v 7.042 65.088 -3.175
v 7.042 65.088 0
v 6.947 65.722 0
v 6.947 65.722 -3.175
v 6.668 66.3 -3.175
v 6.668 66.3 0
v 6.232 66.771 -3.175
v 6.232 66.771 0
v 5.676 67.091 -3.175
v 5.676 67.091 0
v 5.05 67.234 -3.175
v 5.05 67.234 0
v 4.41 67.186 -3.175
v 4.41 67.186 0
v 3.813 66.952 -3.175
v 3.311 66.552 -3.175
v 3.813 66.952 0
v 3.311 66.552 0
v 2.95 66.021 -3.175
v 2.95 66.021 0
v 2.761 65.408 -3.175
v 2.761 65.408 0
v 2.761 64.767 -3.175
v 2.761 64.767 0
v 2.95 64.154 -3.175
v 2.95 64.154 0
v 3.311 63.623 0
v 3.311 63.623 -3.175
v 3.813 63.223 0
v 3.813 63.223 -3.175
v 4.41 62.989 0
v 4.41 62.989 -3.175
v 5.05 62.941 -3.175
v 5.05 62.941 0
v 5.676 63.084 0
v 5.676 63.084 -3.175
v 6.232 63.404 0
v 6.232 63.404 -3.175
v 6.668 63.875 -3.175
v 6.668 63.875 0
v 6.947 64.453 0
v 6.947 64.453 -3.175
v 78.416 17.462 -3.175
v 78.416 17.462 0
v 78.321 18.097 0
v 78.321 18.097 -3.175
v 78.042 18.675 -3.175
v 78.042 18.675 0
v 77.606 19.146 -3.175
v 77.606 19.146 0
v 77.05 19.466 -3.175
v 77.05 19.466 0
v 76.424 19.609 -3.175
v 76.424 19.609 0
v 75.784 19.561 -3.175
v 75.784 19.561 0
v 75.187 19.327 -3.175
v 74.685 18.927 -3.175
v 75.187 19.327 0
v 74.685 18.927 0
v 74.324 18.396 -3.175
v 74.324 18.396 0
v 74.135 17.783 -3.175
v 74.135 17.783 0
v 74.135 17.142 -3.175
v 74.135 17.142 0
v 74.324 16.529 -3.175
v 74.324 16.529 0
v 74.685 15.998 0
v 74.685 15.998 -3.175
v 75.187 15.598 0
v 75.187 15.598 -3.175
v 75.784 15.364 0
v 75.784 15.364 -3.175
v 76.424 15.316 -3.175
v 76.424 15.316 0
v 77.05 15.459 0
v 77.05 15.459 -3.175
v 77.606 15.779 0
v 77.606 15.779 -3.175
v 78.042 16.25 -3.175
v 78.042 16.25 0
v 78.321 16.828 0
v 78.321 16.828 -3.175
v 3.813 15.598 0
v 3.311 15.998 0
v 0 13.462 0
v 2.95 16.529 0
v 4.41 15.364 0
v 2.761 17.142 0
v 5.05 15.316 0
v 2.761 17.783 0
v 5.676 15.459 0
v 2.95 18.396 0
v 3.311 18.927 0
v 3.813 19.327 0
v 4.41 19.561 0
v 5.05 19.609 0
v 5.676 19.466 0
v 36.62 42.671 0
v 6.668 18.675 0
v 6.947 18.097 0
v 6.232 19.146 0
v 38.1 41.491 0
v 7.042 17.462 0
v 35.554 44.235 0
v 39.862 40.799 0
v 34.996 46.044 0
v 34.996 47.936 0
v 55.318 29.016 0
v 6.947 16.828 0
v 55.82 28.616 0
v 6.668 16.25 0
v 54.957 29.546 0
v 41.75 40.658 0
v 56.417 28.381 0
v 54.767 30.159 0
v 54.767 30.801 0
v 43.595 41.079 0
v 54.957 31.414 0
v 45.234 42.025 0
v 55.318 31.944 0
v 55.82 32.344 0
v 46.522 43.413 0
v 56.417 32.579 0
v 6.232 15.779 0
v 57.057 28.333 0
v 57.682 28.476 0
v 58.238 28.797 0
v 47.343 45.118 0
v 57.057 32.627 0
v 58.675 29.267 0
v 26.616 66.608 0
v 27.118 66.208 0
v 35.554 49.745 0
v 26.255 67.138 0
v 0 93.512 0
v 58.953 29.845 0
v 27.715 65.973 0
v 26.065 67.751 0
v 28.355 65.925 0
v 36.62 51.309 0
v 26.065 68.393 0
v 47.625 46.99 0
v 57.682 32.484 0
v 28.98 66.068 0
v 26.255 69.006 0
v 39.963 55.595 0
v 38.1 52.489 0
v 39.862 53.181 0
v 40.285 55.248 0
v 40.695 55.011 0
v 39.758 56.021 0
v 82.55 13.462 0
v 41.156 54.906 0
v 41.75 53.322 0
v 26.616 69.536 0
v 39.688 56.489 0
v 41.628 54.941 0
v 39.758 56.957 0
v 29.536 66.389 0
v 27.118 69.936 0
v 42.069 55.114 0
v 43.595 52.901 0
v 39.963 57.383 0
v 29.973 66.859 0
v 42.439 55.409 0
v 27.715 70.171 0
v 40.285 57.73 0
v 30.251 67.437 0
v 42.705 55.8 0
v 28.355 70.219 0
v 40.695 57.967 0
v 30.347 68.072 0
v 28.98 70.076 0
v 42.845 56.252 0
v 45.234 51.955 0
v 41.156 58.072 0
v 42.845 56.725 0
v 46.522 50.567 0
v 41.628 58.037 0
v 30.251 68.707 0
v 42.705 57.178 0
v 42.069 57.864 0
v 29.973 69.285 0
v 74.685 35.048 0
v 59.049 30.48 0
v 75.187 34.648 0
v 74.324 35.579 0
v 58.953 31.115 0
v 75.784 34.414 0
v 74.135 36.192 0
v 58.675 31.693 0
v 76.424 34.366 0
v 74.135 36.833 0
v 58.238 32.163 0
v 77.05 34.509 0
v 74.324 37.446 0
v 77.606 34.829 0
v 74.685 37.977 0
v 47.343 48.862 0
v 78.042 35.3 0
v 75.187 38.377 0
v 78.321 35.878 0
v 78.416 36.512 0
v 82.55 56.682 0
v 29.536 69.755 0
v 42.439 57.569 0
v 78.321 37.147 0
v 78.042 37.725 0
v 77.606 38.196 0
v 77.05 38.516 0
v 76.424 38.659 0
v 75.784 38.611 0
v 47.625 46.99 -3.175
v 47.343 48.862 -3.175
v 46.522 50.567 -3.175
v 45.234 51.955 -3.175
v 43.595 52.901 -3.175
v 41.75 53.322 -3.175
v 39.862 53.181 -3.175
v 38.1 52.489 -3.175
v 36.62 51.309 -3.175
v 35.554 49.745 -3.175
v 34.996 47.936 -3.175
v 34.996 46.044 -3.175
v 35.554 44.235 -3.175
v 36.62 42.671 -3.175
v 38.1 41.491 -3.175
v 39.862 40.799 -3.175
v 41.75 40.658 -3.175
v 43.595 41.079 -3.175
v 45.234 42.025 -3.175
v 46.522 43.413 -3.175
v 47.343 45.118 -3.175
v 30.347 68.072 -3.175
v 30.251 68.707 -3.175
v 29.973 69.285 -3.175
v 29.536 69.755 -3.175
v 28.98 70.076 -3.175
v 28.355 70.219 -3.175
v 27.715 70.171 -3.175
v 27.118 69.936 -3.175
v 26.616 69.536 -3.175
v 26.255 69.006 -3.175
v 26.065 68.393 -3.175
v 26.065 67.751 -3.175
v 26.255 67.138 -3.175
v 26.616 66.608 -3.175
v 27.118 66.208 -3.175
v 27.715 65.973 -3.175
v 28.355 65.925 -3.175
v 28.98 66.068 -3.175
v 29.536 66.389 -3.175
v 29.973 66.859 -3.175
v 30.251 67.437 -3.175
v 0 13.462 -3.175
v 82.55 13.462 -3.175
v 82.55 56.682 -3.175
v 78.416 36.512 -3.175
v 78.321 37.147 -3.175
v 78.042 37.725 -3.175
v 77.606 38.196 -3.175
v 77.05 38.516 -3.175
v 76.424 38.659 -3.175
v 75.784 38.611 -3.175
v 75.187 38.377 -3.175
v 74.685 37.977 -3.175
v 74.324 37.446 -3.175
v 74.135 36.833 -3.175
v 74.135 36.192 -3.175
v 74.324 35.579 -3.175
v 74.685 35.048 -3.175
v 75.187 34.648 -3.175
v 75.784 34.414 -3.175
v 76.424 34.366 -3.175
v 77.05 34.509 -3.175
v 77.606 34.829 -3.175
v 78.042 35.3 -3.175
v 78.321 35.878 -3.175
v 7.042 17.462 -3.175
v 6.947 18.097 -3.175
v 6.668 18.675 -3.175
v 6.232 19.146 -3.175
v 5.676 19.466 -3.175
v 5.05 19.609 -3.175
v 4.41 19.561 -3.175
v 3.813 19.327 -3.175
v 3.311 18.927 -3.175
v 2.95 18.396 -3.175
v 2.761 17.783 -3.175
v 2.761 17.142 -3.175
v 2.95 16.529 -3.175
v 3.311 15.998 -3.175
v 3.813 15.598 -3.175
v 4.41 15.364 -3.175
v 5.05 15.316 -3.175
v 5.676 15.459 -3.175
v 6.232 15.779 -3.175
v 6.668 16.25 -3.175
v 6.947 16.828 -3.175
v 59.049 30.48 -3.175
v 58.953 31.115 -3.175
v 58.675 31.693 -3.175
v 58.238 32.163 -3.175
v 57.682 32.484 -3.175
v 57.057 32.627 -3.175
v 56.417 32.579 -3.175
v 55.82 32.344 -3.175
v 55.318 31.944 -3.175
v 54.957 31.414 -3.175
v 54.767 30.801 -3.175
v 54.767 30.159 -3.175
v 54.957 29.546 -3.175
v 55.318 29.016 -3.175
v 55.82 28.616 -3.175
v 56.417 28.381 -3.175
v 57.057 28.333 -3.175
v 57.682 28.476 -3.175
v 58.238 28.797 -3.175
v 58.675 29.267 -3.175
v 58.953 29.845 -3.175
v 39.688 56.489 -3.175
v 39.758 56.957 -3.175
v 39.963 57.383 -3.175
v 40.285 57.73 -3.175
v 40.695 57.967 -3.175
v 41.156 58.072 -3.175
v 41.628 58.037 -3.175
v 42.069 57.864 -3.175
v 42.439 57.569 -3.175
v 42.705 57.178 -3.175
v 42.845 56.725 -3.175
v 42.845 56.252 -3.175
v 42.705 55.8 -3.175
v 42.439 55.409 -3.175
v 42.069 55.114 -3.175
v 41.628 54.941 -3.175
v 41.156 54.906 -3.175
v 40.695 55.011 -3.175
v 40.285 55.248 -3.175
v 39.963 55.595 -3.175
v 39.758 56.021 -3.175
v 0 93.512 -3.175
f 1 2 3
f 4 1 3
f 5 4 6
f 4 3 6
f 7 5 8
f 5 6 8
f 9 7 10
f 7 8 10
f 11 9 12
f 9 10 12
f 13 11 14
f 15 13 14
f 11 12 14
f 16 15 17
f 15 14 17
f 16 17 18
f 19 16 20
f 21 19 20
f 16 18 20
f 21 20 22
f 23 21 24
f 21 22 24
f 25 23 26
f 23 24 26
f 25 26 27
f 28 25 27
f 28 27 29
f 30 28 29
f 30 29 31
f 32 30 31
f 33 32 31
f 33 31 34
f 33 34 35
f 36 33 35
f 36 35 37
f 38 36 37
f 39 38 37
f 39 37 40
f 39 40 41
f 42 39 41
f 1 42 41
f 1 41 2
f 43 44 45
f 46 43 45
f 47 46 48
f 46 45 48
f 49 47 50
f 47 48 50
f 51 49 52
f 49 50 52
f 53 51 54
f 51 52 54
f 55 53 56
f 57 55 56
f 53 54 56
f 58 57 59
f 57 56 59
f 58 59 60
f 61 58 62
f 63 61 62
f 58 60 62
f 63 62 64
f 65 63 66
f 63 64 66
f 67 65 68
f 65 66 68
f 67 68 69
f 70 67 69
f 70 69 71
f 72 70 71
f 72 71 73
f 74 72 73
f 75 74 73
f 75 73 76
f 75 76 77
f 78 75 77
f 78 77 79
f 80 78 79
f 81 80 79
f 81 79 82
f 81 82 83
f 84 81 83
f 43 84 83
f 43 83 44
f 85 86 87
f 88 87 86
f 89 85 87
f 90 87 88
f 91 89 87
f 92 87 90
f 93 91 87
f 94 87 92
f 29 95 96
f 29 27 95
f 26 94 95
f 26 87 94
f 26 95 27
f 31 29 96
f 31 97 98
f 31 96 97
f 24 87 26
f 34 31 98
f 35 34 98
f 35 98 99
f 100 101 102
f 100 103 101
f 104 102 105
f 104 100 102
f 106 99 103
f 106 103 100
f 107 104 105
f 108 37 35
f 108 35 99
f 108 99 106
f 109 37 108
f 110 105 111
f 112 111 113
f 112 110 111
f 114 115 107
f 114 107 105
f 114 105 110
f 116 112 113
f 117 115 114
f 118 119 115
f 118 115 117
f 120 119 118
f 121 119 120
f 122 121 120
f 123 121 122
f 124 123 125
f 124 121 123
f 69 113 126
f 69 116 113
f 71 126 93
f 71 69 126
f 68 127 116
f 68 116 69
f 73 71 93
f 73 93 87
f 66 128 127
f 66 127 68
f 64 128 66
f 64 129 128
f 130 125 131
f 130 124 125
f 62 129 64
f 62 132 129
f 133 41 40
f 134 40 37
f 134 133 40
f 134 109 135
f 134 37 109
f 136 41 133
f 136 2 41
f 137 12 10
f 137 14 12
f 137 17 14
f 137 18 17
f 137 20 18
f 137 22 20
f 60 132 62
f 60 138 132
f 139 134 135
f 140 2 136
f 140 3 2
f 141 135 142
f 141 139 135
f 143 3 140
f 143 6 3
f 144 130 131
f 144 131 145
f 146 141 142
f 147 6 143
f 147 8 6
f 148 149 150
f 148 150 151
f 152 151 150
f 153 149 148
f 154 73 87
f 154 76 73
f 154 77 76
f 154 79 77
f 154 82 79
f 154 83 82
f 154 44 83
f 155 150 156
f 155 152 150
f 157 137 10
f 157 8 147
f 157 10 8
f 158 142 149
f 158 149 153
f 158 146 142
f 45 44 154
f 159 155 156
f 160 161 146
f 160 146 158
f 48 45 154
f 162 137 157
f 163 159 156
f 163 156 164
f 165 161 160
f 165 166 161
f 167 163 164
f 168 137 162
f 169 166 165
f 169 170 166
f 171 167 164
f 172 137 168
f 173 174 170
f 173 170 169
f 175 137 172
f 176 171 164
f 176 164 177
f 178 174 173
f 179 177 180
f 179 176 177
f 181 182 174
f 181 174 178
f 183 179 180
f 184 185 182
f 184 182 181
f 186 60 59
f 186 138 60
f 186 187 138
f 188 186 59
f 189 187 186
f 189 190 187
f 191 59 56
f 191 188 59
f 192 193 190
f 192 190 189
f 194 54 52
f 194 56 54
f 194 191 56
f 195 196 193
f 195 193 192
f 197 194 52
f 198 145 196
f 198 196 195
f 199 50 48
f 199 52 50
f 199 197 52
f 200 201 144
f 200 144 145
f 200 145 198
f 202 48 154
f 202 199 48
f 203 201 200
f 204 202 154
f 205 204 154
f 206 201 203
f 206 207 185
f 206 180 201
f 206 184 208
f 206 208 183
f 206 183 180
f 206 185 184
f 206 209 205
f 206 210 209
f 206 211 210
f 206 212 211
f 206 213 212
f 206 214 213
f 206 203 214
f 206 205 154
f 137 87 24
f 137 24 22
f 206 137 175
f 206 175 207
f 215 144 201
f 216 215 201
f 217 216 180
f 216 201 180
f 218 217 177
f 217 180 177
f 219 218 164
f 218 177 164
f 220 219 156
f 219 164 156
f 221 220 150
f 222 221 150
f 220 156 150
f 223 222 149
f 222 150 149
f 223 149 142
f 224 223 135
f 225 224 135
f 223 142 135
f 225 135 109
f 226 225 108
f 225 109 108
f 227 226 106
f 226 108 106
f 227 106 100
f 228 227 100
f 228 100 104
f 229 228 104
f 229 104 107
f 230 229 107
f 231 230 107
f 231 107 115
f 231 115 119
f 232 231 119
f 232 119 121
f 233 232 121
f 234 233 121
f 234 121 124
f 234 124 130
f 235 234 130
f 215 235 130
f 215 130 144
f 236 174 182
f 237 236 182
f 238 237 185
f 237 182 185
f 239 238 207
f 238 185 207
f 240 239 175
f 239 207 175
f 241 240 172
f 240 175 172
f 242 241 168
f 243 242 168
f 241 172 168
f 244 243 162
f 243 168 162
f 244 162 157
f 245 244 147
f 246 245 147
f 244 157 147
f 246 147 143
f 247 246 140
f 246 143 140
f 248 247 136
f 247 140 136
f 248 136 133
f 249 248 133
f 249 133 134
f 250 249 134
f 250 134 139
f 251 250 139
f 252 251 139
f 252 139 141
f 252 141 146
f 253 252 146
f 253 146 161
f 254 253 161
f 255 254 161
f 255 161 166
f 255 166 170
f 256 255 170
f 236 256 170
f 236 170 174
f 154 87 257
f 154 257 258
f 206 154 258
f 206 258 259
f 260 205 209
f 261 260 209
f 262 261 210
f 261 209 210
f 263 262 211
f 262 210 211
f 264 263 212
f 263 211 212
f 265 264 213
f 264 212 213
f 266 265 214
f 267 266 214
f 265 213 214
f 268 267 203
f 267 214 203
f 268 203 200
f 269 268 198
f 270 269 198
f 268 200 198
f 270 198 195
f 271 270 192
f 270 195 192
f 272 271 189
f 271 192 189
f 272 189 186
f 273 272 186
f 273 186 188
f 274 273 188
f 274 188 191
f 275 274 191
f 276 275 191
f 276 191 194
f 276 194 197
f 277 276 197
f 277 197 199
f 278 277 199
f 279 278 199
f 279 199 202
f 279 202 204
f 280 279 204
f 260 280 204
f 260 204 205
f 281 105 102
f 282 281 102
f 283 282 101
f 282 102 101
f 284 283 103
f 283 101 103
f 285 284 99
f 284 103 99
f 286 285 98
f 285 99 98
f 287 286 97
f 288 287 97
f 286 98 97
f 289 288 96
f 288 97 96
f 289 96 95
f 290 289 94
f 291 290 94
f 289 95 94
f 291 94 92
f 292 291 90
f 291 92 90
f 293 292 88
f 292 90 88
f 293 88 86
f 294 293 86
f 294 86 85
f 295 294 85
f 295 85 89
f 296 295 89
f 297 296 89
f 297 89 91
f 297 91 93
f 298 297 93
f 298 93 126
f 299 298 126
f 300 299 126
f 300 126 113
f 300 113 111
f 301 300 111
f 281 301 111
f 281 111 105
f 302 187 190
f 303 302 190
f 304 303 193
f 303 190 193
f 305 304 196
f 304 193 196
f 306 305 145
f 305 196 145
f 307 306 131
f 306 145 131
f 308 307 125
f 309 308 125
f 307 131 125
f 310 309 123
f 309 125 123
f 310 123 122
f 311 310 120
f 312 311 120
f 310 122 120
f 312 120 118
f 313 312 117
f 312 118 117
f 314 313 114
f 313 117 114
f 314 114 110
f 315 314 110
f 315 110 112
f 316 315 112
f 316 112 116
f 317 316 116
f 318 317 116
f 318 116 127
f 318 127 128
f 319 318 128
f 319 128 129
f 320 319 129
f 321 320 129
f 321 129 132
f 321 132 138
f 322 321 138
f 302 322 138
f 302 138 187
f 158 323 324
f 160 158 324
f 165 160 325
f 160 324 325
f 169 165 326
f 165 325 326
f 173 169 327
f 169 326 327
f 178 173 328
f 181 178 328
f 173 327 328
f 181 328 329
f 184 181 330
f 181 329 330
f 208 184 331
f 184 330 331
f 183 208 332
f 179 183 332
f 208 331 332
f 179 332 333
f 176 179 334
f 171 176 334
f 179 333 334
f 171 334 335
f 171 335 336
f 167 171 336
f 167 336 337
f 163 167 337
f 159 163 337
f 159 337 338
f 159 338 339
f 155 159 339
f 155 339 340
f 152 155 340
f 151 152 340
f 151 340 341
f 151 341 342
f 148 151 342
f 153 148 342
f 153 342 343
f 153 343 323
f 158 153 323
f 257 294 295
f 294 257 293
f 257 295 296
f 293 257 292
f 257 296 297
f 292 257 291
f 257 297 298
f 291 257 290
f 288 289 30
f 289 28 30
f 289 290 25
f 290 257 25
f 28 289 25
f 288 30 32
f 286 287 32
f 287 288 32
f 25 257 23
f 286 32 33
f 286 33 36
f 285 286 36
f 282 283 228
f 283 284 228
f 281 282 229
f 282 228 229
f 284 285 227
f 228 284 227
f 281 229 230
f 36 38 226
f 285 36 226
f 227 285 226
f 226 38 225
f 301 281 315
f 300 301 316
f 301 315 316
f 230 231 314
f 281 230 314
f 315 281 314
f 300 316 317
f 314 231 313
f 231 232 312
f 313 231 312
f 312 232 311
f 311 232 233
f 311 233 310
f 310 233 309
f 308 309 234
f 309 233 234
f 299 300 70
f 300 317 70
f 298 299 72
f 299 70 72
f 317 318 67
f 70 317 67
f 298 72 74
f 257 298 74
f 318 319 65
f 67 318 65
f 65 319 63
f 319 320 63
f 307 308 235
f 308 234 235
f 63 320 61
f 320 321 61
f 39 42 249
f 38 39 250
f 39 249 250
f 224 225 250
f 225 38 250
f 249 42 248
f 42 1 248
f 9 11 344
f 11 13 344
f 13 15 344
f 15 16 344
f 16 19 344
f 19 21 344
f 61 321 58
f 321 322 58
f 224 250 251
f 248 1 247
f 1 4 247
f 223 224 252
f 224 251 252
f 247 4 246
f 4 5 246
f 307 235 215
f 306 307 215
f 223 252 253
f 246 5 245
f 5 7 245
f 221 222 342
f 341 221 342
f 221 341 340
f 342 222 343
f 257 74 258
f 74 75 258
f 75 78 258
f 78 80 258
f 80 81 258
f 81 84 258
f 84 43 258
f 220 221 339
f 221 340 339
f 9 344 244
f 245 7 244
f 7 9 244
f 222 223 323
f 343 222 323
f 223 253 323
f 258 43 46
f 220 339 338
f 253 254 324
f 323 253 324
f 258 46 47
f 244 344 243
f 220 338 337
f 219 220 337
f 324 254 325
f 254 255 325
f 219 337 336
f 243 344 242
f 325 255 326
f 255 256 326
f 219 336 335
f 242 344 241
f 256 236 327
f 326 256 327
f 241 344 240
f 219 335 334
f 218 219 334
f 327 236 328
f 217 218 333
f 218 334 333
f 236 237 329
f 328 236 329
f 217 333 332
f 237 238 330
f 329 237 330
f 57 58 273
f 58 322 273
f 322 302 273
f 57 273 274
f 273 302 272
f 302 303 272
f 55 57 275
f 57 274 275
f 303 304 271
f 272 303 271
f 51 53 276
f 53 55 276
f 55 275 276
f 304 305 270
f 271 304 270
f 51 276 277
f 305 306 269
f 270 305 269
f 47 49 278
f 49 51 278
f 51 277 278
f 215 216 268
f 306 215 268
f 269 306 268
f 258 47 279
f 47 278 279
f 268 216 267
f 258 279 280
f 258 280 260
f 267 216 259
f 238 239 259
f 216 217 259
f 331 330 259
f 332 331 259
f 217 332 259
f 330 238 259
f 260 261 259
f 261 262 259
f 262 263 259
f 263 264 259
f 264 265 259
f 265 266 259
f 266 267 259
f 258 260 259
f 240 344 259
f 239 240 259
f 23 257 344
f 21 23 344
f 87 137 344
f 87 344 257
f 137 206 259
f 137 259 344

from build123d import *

# Parameters (mm, degrees)
BOSS_EXTRUDE1_DEPTH          = 3.175
F_6_CLEARANCE_HOLE1_D        = 4.3053
F_1_2_0_5_DIAMETER_HOLE1_D   = 12.7
F_1_8_0_125_DIAMETER_HOLE1_D = 3.175
CUT_EXTRUDE1_DEPTH           = 4.175
SKETCH10_W                   = 82.55
SKETCH10_H                   = 13.462
CUT_EXTRUDE2_DEPTH           = 4.175


with BuildPart() as part:
    # Sketch1 → Boss-Extrude1 (new body)
    with BuildSketch(Plane.XY):
        with BuildLine():
            Line((49.022, 13.462), (57.658, 13.462))
            ThreePointArc((57.658, 13.462), (61.250102448, 11.974102448), (62.738, 8.382))
            Line((62.738, 8.382), (62.738, 0))
            Line((62.738, 0), (82.55, 0))
            Line((82.55, 0), (82.55, 58.42))
            Line((82.55, 58.42), (0, 95.25))
            Line((0, 95.25), (0, 0))
            Line((0, 0), (43.942, 0))
            Line((43.942, 0), (43.942, 8.382))
            ThreePointArc((43.942, 8.382), (45.429897552, 11.974102448), (49.022, 13.462))
        make_face()
    extrude(amount=-BOSS_EXTRUDE1_DEPTH)

    # #6 Clearance Hole1 (through all)
    with Locations(Plane(origin=(0, 0, -3.175), x_dir=(-1, 0, 0), z_dir=(0, 0, -1))):
        with Locations((-4.8895, 17.4625), (-4.8895, 65.0875), (-76.2635, 36.5125), (-76.2635, 17.4625), (-28.194, 68.072), (-56.896, 30.48)):
            Hole(F_6_CLEARANCE_HOLE1_D / 2)

    # 1/2 (0.5) Diameter Hole1 (through all)
    with Locations(Plane(origin=(0, 0, -3.175), x_dir=(-1, 0, 0), z_dir=(0, 0, -1))):
        with Locations((-41.275, 46.99)):
            Hole(F_1_2_0_5_DIAMETER_HOLE1_D / 2)

    # 1/8 (0.125) Diameter Hole1 (through all)
    with Locations(Plane.XY):
        with Locations((41.275, 56.488873013)):
            Hole(F_1_8_0_125_DIAMETER_HOLE1_D / 2)

    # Sketch9 → Cut-Extrude1 (cut, through all)
    with BuildSketch(Plane.XY):
        Polygon((82.55, 56.681667019), (0, 93.511667019), (0, 95.25), (82.55, 58.42), align=None)
    extrude(amount=-CUT_EXTRUDE1_DEPTH, mode=Mode.SUBTRACT)

    # Sketch10 → Cut-Extrude2 (cut, through all)
    with BuildSketch(Plane.XY):
        with Locations((41.275, 6.731)):
            Rectangle(SKETCH10_W, SKETCH10_H)
    extrude(amount=-CUT_EXTRUDE2_DEPTH, mode=Mode.SUBTRACT)


solid = part.part
